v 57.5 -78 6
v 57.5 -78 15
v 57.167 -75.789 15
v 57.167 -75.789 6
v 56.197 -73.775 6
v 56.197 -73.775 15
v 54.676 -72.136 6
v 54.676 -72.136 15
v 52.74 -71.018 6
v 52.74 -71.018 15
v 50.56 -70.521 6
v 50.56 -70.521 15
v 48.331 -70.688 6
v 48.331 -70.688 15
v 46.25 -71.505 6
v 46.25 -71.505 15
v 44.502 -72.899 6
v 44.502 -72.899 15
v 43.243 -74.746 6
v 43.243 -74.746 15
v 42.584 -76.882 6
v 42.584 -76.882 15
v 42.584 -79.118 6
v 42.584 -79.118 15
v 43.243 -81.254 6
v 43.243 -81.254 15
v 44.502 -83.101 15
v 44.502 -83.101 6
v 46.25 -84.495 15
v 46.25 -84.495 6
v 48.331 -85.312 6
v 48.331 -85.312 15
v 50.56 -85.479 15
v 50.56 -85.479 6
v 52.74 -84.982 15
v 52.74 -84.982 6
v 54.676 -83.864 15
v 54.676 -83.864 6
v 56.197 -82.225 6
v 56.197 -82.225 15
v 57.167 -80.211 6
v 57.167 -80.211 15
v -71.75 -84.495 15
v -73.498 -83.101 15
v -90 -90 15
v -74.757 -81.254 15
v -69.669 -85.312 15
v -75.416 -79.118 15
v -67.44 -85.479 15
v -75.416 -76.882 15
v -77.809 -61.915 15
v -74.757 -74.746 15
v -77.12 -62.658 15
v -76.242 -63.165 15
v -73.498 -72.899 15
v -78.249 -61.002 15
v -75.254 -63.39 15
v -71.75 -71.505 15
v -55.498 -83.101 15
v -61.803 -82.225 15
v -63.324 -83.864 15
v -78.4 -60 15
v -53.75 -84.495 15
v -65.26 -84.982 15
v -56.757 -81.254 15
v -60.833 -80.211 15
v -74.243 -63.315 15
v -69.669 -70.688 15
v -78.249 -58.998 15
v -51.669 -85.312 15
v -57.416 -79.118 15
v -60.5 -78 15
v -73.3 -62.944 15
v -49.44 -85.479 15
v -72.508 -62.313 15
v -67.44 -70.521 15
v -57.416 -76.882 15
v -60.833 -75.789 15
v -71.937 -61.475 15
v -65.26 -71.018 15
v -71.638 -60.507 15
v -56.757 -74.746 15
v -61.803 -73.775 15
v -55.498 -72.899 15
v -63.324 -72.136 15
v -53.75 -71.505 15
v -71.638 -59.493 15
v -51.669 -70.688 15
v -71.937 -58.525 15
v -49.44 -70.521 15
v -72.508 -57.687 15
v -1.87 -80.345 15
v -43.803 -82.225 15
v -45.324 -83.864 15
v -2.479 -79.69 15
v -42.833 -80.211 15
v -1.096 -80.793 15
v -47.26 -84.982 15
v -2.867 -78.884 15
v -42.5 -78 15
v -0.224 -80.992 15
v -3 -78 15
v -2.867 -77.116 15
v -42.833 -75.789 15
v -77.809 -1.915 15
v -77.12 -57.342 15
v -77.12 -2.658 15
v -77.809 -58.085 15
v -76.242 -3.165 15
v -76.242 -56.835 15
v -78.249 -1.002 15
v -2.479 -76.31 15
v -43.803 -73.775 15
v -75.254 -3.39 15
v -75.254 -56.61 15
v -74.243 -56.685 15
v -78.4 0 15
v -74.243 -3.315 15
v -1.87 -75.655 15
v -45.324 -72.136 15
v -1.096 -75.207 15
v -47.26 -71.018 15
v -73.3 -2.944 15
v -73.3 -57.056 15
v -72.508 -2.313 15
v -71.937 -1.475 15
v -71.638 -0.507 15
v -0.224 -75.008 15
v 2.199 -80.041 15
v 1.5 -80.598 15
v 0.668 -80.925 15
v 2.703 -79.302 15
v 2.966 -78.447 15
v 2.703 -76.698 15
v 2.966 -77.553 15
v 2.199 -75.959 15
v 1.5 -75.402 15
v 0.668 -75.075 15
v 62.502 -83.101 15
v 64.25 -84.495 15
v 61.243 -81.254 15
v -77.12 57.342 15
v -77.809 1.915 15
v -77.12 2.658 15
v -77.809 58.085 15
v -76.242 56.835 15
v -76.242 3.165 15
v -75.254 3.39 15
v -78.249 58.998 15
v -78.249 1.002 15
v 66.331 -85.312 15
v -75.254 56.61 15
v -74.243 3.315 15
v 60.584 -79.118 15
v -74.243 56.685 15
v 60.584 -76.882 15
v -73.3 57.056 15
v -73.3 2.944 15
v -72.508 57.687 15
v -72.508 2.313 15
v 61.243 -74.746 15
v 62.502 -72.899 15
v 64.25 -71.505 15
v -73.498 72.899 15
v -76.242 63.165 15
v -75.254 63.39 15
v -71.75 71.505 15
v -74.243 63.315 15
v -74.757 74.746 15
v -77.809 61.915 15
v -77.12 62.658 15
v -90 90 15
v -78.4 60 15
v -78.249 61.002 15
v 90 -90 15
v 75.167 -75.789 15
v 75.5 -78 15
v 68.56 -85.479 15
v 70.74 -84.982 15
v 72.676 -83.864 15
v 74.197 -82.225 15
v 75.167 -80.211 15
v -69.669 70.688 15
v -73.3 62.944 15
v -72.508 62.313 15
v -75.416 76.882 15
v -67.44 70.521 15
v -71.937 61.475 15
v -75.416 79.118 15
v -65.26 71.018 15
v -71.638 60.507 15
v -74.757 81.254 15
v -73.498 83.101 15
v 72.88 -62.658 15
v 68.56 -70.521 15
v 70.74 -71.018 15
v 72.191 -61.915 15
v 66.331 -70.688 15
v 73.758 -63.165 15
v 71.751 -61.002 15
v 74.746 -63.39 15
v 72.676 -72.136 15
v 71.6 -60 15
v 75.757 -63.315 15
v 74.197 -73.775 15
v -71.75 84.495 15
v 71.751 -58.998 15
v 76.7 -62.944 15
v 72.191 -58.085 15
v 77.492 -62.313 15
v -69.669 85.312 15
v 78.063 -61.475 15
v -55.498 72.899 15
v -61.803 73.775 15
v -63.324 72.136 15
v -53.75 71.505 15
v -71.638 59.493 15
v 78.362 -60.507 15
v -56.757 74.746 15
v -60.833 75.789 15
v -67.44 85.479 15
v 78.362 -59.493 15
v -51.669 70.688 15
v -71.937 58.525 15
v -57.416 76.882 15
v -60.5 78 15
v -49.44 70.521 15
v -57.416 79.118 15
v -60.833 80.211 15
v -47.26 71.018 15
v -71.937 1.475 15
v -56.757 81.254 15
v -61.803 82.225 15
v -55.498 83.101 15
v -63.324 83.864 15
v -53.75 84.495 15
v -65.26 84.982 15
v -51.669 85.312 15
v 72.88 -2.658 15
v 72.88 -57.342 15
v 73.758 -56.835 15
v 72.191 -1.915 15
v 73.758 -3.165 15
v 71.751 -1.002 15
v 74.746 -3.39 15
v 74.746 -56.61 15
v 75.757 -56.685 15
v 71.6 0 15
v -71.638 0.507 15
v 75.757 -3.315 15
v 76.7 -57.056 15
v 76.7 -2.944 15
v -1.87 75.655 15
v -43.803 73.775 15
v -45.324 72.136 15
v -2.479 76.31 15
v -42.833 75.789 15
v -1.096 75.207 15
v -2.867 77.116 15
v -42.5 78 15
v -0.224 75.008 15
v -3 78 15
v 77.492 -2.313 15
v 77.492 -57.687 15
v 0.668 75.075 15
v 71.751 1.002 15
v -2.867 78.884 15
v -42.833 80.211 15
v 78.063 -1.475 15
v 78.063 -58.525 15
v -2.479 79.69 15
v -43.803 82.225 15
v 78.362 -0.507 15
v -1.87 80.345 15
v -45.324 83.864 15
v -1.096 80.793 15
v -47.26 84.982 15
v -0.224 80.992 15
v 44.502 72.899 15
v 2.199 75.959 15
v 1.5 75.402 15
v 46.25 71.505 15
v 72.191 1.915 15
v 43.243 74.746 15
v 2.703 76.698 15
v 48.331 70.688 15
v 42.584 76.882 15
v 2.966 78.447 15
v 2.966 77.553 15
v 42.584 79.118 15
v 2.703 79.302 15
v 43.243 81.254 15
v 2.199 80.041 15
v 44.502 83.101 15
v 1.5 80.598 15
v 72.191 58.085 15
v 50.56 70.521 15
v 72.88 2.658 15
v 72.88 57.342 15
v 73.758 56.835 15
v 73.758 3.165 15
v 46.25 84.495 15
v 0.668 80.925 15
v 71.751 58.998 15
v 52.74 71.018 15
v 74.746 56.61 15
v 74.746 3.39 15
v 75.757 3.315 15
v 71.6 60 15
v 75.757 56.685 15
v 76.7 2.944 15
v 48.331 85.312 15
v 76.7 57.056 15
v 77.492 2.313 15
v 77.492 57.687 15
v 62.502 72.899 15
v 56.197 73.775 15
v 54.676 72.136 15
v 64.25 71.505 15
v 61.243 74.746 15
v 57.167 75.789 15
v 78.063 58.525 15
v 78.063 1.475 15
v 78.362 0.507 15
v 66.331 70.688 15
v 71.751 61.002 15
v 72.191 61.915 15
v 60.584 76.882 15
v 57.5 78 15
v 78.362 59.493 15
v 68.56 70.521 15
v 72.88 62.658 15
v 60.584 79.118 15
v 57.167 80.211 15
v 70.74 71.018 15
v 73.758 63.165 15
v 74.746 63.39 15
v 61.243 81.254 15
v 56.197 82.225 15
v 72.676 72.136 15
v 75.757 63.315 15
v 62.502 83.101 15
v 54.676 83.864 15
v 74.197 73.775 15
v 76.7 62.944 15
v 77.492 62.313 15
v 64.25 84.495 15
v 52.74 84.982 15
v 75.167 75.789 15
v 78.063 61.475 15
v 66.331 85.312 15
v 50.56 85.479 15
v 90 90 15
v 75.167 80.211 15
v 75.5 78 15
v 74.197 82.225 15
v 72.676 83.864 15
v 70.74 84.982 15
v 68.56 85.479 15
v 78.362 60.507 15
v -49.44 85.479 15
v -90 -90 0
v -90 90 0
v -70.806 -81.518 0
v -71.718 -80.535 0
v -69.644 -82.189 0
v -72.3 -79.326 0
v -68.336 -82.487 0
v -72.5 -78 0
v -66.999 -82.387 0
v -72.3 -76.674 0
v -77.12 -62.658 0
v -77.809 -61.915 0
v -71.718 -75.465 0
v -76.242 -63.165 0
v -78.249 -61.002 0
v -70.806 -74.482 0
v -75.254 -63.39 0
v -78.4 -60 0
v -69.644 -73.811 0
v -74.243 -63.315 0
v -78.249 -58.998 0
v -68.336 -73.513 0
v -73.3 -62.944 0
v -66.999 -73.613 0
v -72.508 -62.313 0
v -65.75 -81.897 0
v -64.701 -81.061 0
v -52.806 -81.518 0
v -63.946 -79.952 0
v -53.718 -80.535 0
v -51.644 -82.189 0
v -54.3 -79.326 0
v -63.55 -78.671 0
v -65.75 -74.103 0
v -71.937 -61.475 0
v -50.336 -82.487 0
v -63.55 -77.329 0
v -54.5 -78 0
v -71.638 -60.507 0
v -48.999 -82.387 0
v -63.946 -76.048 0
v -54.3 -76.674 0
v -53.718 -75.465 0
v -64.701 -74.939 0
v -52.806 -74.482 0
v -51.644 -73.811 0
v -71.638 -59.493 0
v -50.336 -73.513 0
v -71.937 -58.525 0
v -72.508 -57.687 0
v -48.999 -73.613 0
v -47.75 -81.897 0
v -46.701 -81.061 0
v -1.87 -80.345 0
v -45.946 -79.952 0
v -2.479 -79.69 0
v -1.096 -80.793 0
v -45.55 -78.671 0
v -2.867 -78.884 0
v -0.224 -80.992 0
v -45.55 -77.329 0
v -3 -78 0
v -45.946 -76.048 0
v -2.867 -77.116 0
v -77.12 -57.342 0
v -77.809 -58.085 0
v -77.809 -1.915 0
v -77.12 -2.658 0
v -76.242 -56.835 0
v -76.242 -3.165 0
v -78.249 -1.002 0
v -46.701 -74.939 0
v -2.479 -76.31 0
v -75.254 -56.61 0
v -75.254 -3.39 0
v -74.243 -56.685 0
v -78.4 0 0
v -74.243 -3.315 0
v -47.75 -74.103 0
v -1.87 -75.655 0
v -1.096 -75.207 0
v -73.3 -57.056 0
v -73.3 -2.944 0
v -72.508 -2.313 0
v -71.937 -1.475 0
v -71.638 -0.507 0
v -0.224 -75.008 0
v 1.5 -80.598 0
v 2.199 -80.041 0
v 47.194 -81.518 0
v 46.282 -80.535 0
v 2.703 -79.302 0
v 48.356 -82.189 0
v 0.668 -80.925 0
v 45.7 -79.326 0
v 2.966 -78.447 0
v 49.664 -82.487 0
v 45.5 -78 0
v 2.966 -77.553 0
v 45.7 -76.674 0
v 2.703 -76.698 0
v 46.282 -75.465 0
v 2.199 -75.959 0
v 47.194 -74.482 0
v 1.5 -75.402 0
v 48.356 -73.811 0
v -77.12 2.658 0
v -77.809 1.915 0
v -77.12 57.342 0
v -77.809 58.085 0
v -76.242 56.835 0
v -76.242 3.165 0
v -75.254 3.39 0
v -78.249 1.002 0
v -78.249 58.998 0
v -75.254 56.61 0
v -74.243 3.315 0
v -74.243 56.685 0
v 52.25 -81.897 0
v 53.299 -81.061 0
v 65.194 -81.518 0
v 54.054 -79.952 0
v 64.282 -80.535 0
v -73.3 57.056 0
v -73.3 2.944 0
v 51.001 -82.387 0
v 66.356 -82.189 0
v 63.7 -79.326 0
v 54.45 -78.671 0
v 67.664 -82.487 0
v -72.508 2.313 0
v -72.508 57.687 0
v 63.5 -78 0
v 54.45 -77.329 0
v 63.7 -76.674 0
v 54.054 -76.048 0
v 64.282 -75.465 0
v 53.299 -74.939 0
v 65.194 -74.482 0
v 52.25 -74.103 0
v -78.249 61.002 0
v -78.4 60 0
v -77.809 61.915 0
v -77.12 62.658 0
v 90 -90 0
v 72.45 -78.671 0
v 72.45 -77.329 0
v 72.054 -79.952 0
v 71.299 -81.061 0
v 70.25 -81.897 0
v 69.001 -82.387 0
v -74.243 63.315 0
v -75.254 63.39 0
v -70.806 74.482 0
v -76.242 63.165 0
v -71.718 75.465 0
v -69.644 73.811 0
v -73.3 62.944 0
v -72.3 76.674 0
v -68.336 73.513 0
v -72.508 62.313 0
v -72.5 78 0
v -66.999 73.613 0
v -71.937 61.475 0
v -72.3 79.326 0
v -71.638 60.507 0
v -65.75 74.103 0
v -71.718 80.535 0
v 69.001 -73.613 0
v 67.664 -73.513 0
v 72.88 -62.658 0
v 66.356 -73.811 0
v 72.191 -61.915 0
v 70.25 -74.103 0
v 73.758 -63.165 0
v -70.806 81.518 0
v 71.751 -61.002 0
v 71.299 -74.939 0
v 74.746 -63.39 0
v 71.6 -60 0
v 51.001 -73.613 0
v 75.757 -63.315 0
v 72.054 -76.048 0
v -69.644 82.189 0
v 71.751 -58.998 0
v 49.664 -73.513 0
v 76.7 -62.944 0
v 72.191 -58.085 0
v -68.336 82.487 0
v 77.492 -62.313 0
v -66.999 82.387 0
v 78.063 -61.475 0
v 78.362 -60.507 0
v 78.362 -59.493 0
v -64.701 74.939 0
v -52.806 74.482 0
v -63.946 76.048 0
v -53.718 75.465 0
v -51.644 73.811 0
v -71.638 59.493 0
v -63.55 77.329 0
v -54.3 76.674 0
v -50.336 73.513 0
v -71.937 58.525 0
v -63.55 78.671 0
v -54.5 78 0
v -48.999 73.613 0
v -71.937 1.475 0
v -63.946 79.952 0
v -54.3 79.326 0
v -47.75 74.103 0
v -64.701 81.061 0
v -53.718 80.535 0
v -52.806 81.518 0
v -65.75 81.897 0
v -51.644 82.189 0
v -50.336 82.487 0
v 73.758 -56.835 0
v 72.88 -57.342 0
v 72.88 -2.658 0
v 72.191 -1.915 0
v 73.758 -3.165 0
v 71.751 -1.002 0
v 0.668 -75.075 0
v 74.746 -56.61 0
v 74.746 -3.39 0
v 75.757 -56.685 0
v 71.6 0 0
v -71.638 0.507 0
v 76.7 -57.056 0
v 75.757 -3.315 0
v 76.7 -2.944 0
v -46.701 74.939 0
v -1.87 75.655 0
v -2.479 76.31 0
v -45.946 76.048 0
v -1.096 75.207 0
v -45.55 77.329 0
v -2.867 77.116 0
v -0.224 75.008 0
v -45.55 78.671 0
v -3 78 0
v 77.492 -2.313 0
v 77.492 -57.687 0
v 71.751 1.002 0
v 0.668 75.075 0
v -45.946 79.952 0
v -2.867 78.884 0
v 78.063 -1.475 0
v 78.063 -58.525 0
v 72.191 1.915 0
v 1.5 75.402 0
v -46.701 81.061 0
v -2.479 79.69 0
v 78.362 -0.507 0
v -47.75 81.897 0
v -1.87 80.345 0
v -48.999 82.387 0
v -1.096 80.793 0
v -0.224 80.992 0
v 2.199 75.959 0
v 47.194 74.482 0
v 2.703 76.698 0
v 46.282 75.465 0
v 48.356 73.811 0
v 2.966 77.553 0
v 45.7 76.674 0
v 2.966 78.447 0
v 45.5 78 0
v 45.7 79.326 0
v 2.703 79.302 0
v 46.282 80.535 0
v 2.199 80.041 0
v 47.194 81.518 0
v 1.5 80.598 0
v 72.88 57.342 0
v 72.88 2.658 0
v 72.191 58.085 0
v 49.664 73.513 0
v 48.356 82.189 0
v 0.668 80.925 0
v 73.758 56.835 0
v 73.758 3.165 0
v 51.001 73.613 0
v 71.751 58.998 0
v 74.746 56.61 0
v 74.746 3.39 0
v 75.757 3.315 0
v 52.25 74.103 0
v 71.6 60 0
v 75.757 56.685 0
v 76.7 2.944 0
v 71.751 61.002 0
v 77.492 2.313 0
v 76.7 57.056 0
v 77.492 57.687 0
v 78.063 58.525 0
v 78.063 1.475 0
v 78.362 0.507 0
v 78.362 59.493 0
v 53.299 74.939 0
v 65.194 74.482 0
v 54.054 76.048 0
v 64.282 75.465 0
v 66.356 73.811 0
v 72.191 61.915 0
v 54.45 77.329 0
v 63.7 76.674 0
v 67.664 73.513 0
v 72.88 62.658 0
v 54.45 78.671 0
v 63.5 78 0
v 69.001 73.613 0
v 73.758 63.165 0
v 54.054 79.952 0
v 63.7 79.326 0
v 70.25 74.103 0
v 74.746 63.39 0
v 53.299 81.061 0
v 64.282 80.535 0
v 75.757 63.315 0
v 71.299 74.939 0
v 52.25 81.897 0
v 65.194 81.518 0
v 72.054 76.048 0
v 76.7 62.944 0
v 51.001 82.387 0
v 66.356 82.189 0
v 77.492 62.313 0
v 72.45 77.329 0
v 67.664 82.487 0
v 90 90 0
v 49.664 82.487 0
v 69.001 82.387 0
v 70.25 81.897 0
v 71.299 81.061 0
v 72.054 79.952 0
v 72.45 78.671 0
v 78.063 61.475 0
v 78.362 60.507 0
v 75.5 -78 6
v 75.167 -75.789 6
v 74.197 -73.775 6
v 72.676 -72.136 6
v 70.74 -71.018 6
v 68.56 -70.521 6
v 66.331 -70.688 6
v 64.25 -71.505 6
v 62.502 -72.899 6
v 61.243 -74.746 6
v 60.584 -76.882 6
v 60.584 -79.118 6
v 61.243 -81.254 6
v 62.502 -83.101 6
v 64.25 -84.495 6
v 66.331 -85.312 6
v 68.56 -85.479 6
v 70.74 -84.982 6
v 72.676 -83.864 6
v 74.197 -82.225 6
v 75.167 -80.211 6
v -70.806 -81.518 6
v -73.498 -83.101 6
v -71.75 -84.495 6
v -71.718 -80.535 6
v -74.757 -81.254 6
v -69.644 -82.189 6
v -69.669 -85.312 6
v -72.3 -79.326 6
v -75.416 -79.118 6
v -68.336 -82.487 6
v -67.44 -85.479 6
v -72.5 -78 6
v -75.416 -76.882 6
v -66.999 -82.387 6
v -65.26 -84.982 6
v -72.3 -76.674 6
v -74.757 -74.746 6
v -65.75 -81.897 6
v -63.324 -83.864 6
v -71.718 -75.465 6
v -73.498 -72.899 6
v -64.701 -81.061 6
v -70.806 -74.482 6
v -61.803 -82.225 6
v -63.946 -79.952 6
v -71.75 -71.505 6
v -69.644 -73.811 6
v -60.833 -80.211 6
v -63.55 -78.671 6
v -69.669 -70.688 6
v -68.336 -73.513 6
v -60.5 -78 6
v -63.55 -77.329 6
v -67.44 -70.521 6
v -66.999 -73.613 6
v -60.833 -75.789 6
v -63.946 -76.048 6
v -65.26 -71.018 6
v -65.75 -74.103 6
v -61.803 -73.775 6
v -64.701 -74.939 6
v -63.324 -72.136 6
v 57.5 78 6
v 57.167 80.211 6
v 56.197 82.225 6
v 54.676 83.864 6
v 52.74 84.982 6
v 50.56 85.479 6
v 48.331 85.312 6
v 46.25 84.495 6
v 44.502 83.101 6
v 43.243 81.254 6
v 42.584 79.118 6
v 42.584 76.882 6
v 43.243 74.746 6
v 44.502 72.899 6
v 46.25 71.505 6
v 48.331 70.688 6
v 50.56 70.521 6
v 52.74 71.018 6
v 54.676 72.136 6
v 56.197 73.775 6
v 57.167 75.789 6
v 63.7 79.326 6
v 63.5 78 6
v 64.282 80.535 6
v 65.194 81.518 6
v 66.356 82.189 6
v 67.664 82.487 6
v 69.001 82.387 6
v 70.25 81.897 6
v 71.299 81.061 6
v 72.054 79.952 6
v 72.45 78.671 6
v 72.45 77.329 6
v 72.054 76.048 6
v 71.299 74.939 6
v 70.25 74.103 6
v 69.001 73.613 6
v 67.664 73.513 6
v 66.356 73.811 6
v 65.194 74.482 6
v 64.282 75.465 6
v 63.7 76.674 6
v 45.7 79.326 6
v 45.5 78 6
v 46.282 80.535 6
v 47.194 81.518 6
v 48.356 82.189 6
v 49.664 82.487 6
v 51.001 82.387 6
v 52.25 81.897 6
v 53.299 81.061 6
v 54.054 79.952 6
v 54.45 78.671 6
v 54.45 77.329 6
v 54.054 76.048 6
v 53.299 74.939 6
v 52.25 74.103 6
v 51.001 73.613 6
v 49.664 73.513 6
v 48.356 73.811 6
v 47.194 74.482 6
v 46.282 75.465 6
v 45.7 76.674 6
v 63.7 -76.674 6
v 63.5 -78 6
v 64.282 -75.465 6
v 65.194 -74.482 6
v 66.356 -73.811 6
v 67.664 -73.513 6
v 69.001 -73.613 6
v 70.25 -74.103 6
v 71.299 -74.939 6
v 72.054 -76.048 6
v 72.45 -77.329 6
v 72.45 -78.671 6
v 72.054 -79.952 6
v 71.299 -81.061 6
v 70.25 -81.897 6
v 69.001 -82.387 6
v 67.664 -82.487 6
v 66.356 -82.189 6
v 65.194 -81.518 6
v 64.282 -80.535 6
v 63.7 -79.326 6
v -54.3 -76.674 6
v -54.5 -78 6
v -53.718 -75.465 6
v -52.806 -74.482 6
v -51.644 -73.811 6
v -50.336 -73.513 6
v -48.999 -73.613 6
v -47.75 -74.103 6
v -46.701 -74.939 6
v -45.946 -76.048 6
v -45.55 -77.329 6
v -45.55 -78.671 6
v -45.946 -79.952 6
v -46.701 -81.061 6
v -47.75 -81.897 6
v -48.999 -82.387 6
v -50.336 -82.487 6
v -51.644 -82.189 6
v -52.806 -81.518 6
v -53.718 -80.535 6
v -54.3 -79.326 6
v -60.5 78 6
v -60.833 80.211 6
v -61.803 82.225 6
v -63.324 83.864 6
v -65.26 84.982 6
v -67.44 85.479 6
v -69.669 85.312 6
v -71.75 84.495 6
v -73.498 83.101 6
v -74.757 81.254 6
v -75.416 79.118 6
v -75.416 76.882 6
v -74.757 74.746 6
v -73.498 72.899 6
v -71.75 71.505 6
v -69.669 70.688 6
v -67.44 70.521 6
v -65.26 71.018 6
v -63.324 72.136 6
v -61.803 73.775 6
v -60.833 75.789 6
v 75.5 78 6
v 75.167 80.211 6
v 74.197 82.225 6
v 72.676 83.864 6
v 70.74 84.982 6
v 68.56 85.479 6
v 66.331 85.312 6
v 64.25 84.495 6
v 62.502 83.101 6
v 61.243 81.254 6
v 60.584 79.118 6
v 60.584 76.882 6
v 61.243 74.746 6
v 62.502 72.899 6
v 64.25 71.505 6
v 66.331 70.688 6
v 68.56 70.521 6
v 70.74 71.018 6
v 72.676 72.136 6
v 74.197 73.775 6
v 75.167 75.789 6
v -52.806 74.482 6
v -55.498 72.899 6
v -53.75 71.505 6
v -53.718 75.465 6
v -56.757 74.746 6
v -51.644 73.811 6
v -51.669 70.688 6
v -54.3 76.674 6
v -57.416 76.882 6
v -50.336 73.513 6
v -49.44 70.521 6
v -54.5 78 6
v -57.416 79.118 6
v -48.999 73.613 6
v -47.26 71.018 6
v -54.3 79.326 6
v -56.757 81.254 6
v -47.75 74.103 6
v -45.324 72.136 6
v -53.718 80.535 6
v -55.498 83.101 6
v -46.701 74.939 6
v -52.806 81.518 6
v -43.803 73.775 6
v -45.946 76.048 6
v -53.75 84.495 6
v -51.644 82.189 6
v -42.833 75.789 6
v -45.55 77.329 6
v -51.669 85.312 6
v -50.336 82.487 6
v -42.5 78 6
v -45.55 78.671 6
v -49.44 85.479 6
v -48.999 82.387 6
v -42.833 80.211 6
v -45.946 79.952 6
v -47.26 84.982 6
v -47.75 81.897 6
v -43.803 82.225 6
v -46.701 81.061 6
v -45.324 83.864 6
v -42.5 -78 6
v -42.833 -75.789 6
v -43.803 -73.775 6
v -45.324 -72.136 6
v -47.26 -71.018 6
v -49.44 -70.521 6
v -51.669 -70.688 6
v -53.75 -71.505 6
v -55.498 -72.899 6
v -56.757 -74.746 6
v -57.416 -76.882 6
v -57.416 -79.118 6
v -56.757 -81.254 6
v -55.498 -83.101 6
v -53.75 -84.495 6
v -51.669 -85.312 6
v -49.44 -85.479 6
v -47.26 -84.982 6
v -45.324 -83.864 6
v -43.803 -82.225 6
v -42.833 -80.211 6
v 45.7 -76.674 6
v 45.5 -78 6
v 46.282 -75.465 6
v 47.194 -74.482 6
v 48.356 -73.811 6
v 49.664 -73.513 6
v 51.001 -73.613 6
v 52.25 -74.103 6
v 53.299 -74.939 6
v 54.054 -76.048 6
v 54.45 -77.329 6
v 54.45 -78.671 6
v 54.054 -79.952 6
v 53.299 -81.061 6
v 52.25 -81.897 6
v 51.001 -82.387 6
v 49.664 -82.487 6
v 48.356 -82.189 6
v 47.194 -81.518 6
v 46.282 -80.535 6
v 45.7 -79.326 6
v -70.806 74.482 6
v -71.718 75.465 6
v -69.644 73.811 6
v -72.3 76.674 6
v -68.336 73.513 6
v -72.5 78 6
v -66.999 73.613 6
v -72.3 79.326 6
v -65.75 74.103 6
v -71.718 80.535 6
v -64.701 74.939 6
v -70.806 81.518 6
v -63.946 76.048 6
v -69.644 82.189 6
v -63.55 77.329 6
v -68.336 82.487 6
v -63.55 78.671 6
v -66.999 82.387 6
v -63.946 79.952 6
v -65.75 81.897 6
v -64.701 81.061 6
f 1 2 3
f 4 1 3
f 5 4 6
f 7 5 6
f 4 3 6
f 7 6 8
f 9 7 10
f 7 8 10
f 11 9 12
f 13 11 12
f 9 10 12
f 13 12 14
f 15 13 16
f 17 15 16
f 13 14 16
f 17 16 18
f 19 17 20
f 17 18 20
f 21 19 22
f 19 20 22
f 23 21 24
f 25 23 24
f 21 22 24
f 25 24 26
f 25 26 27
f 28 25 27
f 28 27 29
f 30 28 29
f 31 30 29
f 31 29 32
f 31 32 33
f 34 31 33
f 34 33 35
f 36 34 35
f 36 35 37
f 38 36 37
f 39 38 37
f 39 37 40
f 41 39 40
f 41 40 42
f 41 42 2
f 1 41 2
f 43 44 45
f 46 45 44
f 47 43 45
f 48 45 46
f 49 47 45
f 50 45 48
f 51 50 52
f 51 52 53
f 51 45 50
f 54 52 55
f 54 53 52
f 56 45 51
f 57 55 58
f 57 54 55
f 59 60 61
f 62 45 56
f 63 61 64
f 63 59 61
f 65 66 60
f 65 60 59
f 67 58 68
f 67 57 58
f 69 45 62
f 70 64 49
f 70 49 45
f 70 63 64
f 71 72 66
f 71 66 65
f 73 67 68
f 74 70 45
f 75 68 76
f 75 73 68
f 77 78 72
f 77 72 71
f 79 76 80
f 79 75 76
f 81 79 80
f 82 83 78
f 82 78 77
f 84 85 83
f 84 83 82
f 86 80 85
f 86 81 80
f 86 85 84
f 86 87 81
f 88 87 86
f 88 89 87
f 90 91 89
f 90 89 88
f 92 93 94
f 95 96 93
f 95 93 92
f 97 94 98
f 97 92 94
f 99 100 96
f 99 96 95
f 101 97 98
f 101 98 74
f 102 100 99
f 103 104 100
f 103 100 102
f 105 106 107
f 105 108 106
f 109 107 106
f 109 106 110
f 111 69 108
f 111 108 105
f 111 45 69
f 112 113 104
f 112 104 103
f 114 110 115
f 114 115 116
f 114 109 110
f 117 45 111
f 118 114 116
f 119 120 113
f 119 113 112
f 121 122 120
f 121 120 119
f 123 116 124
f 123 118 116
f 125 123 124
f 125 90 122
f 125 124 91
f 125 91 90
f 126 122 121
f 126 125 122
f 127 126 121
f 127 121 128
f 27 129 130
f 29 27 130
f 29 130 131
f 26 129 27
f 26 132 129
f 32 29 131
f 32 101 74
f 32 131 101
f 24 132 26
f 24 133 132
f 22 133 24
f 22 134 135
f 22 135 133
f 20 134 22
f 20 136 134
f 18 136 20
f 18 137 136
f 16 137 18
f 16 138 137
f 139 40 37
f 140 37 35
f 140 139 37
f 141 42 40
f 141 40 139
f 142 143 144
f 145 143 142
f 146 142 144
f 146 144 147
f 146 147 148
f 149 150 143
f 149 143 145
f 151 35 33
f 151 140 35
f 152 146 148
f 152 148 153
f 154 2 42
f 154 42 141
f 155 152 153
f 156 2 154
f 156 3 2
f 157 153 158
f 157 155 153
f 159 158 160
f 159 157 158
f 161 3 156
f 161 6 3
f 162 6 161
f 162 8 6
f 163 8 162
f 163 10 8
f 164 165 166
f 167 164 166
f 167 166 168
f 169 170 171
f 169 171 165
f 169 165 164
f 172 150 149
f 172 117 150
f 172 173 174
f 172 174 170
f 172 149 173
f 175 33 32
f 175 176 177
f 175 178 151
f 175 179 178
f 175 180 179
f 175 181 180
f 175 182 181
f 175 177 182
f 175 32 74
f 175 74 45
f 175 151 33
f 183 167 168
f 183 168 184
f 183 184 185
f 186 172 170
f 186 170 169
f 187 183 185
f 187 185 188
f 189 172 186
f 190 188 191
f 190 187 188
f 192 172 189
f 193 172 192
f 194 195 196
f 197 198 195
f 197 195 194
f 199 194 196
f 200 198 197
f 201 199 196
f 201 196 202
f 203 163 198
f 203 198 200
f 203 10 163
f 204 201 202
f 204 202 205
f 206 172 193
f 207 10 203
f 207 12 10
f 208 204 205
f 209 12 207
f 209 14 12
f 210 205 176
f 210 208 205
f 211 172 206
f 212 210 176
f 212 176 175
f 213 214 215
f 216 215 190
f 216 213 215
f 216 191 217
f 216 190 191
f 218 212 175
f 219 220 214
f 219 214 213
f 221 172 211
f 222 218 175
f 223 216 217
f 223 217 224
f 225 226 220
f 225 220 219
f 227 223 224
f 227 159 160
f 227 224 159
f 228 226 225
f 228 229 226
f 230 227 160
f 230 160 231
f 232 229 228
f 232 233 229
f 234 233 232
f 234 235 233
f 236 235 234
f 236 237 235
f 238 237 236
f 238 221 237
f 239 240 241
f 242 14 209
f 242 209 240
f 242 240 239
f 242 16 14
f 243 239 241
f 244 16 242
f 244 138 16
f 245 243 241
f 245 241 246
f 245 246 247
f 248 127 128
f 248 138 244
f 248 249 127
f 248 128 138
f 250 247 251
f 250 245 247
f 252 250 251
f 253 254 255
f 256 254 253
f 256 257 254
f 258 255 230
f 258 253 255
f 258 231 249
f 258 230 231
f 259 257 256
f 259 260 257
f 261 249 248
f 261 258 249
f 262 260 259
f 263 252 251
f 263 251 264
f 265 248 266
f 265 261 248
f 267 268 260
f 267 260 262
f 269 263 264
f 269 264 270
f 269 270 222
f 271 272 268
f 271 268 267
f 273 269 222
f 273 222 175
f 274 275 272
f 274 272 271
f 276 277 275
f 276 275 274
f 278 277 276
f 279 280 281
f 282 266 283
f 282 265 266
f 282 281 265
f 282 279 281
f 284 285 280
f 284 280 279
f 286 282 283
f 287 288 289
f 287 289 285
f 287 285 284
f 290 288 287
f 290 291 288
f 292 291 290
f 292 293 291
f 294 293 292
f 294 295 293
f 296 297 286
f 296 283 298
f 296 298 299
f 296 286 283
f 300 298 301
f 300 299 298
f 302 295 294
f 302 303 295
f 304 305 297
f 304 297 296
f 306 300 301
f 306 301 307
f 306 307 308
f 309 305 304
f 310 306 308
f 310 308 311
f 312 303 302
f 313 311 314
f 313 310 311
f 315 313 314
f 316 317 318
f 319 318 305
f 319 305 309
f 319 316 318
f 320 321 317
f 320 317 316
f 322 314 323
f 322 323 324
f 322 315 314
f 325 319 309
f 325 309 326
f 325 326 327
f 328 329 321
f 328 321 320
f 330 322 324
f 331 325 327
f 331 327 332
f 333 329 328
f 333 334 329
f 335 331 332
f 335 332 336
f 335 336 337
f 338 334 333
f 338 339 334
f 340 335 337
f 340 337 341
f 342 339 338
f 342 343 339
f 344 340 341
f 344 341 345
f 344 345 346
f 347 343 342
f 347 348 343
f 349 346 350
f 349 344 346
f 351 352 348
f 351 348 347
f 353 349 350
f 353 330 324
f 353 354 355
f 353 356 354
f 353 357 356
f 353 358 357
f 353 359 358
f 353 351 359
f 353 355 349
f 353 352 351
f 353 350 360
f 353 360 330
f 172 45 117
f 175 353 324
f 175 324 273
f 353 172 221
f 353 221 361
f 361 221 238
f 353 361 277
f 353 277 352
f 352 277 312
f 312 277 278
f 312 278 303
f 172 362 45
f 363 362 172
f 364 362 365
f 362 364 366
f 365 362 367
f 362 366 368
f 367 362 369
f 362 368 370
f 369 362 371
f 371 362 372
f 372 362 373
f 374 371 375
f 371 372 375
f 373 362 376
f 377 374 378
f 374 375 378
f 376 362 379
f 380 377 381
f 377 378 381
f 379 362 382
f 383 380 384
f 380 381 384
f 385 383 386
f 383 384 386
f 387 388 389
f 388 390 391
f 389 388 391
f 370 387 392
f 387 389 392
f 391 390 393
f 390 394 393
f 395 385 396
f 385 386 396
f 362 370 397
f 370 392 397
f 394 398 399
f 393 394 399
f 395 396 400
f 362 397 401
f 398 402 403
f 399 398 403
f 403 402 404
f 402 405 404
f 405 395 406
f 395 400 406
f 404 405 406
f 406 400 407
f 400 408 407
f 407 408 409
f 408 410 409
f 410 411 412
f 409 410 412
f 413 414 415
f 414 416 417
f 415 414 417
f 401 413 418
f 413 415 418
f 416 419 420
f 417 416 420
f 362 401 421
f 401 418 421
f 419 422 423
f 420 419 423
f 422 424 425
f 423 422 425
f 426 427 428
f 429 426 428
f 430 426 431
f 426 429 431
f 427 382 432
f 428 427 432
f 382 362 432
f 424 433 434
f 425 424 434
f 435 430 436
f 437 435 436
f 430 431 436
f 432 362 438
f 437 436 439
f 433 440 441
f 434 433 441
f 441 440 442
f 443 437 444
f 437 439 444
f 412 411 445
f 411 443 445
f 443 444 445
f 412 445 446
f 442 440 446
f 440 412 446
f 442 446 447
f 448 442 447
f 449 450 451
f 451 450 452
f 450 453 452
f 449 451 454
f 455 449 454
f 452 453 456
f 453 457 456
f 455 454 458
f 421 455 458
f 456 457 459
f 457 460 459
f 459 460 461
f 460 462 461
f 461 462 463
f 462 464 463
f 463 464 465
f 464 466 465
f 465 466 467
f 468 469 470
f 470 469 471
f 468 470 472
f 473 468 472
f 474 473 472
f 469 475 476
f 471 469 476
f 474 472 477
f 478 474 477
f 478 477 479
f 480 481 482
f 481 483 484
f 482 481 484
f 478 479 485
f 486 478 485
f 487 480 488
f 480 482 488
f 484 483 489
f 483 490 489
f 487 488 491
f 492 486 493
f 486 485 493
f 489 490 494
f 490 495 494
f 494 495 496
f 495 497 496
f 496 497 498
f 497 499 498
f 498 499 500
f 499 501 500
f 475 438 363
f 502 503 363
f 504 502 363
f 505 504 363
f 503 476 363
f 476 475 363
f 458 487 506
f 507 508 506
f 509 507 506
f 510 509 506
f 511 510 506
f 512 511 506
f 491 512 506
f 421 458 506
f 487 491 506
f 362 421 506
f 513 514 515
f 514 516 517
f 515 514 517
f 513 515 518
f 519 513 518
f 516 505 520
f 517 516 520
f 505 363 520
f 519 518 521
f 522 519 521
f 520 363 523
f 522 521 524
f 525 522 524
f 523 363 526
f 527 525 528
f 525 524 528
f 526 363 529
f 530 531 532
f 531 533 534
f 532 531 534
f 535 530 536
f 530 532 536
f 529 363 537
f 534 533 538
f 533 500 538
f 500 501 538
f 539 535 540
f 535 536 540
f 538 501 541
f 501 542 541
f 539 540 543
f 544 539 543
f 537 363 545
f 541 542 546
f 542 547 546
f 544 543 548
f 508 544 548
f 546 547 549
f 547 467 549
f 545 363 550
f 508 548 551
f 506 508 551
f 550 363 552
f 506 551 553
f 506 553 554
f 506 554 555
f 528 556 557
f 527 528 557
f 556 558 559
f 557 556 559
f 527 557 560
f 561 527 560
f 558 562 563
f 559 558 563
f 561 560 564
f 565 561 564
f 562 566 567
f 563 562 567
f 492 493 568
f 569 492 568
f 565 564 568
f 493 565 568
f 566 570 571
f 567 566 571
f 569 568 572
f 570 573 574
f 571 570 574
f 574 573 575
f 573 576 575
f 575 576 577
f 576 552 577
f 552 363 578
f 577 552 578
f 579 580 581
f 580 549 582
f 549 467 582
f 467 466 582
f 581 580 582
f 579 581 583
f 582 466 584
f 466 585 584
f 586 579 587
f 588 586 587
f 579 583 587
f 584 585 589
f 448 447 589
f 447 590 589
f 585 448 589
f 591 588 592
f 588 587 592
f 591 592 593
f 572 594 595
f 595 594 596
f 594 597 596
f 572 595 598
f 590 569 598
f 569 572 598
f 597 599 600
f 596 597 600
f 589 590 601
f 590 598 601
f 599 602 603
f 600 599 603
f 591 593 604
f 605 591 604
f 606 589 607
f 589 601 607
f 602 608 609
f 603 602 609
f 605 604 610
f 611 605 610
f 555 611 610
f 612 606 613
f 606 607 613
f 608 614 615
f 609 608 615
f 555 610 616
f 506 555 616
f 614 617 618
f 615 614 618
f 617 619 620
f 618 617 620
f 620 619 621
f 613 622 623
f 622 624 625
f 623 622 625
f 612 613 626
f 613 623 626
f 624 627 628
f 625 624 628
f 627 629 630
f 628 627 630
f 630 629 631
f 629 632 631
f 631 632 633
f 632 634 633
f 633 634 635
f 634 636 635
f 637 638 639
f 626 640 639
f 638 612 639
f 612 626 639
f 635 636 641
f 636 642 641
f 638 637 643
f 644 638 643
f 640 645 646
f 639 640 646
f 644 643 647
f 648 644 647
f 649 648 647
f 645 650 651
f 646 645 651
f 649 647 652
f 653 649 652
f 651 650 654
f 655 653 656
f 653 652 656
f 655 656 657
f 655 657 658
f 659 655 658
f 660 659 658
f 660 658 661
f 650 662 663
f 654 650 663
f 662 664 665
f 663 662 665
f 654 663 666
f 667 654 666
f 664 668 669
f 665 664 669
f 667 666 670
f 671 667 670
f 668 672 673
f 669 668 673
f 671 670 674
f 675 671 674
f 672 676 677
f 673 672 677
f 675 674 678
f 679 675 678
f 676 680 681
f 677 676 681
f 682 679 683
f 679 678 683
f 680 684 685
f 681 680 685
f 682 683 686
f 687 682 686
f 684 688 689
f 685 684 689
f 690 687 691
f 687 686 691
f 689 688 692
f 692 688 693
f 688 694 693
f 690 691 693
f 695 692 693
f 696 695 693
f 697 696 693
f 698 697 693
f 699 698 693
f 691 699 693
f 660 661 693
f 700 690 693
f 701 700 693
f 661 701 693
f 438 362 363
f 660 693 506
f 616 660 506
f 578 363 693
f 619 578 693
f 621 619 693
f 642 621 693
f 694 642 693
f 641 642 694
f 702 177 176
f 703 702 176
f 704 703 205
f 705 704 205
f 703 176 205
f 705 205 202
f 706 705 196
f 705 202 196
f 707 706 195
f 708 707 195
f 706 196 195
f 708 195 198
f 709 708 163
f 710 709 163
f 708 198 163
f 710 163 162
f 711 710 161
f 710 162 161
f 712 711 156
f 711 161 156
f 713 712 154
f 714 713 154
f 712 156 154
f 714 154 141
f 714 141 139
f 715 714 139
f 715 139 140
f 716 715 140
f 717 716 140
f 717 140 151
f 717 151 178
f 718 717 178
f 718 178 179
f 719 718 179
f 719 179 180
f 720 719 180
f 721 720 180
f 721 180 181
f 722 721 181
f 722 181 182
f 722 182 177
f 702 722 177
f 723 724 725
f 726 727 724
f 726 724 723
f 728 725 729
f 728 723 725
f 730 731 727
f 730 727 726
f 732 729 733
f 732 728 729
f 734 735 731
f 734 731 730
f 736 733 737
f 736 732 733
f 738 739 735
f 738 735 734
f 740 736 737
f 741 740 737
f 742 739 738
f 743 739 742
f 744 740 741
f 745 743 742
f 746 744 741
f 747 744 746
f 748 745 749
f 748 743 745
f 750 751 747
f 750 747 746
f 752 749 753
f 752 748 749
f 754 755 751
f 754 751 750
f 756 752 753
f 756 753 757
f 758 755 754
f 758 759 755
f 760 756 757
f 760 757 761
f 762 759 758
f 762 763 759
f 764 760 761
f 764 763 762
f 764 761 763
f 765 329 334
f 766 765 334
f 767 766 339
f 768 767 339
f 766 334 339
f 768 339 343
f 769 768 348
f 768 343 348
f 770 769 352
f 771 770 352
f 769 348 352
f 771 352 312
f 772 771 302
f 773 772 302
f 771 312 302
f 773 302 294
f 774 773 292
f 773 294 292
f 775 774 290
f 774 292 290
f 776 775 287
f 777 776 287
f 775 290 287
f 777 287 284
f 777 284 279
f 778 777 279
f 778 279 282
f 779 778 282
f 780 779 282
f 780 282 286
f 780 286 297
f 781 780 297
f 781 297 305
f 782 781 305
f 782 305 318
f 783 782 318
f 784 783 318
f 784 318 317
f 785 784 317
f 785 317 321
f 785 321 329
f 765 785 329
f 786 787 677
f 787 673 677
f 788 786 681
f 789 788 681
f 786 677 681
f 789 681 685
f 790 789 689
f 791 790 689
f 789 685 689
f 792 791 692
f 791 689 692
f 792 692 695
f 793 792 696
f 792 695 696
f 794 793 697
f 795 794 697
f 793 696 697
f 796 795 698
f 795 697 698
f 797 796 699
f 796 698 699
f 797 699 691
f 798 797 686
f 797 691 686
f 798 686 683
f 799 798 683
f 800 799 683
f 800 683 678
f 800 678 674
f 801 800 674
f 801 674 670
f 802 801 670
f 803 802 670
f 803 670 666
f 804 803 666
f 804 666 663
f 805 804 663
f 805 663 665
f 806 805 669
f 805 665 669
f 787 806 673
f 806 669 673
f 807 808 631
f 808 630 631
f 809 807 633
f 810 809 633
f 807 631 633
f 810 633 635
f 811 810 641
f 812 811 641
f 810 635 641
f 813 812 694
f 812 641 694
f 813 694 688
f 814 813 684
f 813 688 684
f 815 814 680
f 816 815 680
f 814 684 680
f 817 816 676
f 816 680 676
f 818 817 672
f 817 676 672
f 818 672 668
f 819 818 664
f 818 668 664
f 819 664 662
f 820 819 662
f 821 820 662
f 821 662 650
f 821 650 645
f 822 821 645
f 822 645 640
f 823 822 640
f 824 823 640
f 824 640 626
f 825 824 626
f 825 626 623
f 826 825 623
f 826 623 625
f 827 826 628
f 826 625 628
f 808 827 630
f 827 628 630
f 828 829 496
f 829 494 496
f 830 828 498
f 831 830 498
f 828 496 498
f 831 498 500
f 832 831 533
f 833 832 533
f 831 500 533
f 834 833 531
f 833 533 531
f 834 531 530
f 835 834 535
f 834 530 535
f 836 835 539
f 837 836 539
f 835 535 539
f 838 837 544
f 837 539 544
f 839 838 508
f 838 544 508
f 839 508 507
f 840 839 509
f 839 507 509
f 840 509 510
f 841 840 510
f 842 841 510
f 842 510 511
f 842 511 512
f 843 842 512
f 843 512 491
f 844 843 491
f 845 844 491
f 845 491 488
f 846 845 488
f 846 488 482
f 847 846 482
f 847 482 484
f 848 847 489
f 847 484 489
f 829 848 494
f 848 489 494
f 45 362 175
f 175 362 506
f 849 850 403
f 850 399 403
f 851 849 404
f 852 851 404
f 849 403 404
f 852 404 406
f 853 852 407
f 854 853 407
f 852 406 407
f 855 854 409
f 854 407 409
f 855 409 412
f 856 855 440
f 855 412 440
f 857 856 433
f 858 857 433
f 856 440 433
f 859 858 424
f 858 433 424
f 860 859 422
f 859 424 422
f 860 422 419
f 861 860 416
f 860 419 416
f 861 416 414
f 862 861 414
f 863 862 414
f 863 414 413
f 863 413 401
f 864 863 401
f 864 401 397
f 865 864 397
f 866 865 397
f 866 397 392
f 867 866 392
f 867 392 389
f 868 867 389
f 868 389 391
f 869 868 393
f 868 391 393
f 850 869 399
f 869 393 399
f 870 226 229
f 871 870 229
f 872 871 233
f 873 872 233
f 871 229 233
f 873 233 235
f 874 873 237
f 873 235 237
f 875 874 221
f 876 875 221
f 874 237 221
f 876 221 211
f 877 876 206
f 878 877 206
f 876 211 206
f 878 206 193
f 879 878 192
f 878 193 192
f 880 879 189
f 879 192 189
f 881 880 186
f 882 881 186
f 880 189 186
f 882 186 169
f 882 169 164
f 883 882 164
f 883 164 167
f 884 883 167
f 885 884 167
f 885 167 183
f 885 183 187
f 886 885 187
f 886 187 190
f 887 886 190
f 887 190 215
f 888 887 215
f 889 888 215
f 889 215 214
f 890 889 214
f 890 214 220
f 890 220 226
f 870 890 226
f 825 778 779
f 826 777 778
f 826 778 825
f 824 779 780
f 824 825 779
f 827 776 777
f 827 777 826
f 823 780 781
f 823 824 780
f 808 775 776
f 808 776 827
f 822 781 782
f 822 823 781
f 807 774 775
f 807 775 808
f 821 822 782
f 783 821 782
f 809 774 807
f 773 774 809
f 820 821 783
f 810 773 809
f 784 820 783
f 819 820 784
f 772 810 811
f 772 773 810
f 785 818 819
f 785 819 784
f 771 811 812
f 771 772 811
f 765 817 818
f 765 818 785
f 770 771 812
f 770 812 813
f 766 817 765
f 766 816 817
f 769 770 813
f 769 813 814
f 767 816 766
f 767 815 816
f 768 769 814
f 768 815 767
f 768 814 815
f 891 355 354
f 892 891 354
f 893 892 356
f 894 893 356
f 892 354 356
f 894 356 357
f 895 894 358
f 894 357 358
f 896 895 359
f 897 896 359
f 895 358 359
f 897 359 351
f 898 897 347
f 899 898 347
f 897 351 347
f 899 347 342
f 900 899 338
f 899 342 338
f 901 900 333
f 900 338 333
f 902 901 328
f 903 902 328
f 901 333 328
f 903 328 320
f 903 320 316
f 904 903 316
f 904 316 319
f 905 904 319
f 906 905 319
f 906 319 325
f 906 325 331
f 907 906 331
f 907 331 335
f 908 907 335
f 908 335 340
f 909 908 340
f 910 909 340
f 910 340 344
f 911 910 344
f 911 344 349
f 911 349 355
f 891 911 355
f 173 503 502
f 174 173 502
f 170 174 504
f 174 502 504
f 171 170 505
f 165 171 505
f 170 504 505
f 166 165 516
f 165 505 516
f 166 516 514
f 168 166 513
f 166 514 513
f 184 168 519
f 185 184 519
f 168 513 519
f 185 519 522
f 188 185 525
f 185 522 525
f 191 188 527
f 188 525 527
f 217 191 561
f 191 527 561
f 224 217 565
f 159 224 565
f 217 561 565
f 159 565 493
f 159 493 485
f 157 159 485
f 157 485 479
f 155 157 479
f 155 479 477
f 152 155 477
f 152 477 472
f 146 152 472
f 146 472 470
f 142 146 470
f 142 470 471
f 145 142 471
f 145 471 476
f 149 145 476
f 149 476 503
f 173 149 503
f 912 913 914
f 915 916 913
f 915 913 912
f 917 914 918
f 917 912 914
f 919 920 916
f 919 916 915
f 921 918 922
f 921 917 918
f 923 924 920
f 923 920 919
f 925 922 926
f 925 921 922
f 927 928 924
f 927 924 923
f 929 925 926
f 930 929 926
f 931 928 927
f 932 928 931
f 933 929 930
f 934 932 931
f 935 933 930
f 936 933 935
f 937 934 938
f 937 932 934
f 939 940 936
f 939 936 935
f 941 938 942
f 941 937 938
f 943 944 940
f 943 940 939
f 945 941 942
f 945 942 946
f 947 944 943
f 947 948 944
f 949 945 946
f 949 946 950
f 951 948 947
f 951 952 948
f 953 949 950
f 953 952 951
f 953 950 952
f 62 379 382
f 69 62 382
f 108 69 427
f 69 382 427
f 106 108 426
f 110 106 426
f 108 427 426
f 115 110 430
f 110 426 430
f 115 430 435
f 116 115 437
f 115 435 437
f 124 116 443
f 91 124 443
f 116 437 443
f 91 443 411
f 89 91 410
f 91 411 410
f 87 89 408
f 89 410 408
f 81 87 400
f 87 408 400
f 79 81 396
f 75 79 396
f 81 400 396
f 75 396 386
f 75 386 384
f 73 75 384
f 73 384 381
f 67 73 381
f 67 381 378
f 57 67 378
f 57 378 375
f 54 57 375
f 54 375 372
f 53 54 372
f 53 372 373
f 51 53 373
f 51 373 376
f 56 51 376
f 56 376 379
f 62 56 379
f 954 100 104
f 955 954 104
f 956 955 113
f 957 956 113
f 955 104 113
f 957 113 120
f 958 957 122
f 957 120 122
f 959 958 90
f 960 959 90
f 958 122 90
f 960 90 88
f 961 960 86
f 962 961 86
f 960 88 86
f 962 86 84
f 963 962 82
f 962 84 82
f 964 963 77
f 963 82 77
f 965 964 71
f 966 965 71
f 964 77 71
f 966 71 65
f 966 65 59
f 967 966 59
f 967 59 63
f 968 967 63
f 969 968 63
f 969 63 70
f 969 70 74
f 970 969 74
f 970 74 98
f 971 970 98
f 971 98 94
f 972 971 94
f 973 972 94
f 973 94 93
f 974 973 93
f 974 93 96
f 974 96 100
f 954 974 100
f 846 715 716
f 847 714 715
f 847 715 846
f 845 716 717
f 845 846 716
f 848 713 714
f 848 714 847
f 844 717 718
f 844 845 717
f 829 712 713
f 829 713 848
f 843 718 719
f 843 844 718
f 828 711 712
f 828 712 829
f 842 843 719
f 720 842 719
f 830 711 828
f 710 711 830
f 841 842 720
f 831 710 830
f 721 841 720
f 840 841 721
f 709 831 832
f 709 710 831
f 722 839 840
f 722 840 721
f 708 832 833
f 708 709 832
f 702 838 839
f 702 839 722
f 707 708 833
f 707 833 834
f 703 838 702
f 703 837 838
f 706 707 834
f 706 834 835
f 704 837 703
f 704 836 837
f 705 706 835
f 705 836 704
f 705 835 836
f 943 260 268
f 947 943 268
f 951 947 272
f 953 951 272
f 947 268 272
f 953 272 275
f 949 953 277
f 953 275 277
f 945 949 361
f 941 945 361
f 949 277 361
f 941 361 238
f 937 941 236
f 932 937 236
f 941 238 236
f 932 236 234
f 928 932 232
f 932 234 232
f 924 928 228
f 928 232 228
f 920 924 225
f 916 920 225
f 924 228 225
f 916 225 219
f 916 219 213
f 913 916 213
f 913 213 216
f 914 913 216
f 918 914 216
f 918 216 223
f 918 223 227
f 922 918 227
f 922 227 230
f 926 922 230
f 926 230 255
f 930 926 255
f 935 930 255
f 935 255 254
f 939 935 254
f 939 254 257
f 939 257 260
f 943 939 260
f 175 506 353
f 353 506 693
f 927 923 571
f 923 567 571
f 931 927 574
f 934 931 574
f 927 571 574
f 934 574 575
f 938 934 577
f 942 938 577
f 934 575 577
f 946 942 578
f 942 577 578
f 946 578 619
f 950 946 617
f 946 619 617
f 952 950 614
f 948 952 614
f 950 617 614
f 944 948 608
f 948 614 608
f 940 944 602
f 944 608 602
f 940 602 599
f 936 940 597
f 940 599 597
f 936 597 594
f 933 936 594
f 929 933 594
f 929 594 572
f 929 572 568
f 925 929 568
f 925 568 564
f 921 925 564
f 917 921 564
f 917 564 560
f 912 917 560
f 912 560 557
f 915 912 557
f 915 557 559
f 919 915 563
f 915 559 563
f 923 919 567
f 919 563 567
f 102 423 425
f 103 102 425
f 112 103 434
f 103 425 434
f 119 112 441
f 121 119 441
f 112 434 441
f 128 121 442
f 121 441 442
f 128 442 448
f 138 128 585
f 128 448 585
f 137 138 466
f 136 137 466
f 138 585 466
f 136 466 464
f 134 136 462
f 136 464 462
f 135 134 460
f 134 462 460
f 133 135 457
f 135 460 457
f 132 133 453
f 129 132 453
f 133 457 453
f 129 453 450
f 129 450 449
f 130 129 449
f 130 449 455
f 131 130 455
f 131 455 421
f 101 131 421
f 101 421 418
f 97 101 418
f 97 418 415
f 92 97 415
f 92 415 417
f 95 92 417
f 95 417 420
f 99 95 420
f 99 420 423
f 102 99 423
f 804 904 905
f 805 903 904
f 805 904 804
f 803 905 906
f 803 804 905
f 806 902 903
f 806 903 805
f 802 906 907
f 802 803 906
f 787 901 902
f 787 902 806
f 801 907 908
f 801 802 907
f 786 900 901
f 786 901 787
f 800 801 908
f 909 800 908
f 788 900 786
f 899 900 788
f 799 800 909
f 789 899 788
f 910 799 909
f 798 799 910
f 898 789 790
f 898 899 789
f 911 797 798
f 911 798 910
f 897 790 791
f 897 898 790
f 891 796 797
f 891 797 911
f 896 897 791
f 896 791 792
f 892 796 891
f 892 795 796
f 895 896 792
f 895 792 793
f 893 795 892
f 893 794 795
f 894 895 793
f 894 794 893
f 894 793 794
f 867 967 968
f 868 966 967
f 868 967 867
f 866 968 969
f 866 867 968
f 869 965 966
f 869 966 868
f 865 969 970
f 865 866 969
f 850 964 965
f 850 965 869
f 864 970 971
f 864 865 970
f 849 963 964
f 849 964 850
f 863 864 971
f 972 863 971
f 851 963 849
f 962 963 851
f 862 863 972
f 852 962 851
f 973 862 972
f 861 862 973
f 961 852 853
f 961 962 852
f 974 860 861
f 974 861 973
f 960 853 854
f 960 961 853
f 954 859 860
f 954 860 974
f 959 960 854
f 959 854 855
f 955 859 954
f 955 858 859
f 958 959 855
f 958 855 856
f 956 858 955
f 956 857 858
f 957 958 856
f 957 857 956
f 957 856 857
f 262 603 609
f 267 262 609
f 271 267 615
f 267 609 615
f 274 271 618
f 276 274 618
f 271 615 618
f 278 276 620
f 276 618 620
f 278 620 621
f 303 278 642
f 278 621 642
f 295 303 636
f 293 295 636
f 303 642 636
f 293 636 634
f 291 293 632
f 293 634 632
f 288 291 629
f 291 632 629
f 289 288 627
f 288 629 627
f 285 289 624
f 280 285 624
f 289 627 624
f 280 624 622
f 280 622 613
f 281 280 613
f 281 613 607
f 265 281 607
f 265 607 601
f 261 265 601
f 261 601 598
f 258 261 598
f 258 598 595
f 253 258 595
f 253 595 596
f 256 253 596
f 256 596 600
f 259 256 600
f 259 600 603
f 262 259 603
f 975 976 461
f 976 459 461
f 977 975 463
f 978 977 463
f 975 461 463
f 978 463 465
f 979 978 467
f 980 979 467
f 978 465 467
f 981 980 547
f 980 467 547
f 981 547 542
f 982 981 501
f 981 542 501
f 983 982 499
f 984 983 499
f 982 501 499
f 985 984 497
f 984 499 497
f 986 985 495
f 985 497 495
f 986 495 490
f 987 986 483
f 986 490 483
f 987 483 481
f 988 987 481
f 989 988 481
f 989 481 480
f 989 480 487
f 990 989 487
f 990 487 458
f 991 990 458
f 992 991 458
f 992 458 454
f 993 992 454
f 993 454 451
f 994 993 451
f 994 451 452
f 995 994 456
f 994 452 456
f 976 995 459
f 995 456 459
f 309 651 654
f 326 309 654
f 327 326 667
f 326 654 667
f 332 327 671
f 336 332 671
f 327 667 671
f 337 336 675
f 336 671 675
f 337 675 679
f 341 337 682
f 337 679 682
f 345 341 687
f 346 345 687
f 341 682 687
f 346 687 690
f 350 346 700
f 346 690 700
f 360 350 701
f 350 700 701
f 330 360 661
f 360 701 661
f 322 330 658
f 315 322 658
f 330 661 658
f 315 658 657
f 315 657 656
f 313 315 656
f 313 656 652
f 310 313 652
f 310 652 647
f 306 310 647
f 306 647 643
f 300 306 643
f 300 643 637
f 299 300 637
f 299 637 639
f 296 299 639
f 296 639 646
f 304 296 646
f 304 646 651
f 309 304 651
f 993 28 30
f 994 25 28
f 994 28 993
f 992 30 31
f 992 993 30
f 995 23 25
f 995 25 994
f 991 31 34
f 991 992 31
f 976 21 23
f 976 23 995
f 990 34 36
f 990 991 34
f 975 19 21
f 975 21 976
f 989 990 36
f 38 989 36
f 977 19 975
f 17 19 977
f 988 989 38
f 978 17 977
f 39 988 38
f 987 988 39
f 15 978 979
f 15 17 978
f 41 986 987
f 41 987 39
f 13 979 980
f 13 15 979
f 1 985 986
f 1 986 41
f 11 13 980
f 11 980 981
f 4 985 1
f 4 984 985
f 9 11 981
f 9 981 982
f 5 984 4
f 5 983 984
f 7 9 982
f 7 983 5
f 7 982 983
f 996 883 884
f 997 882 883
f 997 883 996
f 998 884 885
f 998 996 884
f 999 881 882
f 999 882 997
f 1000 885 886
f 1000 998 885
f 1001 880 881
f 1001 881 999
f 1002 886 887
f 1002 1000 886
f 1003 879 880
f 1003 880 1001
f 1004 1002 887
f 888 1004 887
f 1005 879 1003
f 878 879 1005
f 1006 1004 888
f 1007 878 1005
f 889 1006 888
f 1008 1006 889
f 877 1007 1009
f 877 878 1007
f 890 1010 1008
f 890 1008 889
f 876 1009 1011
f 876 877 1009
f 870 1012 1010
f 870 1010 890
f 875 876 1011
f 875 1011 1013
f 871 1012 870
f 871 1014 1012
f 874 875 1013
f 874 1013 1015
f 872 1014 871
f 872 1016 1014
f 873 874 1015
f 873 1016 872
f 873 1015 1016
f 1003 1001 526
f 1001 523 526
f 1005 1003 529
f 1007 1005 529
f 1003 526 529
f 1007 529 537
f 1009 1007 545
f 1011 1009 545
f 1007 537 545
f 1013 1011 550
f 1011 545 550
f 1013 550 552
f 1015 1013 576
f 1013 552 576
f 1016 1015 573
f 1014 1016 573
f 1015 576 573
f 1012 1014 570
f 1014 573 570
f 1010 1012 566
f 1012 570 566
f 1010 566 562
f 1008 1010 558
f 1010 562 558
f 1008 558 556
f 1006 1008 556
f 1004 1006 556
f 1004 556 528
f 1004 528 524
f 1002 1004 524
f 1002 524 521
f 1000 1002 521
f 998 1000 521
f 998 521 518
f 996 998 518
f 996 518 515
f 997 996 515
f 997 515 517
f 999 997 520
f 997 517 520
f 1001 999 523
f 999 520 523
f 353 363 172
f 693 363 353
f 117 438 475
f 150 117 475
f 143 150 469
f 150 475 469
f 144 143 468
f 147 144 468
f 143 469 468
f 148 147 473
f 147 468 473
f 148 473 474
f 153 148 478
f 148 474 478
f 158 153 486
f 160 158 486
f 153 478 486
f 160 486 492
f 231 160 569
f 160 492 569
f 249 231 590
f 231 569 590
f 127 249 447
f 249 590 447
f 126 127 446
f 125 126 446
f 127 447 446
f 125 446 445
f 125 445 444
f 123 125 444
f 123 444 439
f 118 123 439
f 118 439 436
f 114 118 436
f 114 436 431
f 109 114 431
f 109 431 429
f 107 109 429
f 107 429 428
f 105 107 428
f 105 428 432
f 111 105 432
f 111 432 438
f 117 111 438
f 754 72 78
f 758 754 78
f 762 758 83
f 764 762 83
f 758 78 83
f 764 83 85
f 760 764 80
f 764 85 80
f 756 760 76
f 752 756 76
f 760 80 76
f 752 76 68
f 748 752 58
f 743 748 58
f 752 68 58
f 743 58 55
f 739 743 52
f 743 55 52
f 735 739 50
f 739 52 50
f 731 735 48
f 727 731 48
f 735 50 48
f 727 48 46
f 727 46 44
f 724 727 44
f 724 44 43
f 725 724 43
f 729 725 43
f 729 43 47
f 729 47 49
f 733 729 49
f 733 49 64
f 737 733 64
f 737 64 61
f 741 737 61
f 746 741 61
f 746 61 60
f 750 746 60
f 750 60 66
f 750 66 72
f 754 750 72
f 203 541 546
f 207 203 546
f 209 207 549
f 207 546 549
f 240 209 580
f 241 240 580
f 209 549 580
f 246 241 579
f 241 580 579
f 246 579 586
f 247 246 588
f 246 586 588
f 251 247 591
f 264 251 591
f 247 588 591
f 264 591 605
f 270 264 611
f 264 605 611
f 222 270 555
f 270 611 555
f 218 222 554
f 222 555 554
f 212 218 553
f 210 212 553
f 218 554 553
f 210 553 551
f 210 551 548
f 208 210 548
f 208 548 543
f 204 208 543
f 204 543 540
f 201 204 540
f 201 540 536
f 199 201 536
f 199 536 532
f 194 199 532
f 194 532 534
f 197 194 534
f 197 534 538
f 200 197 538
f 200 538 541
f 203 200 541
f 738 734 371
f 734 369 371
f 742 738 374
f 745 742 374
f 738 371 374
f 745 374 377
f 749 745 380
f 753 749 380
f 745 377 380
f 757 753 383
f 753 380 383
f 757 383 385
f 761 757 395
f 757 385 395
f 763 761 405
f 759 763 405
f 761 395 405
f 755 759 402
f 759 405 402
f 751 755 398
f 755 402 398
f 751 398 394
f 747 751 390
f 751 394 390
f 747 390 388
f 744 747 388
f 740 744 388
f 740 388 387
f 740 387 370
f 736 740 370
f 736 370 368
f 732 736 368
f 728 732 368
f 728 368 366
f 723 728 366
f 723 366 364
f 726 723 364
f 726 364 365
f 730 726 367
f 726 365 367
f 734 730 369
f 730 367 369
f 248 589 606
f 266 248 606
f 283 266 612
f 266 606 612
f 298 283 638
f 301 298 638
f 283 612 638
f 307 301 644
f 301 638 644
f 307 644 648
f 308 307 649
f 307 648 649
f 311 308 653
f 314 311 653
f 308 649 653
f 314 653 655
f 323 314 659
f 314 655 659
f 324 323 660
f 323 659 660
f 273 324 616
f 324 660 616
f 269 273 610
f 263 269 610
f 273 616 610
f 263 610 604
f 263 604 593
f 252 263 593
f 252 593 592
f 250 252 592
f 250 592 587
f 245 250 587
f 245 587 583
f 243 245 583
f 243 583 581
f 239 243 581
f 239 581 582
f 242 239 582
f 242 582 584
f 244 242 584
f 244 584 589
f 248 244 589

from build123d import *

# Parameters (mm, degrees)
SKETCH_1_W                    = 180
SKETCH_1_H                    = 180
EXTRUDE_1_DEPTH               = 15
HOLE_WIZARD_4_8_1_D           = 9
HOLE_WIZARD_4_8_1_CBORE_D     = 15
HOLE_WIZARD_4_8_1_CBORE_DEPTH = 9
HOLE_WIZARD_6_0_6_1_D         = 6
HOLE_WIZARD_M8_1_D            = 6.8
HOLE_WIZARD_M8_1_DEPTH        = 22.25
HOLE_WIZARD_M8_1_TIP          = 2.042926105


with BuildPart() as part:
    # 草图1 → 凸台-拉伸1 (new body)
    with BuildSketch(Plane.XY):
        Rectangle(SKETCH_1_W, SKETCH_1_H)
    extrude(amount=EXTRUDE_1_DEPTH)

    # 打孔尺寸根据内六角花形圆柱头螺钉-4.8级的类型1 (through all)
    with Locations(Plane(origin=(-68, -78, 15), x_dir=(1, 0, 0), z_dir=(0, 0, 1))):
        with Locations((0, 0), (18, 0), (118, 0), (136, 0), (136, 156), (118, 156), (18, 156), (0, 156)):
            CounterBoreHole(HOLE_WIZARD_4_8_1_D / 2, HOLE_WIZARD_4_8_1_CBORE_D / 2, HOLE_WIZARD_4_8_1_CBORE_DEPTH)

    # Ø6.0 (6) 直径孔1 (through all)
    with Locations(Plane(origin=(0, 78, 15), x_dir=(1, 0, 0), z_dir=(0, 0, 1))):
        with Locations((0, 0), (0, -156)):
            Hole(HOLE_WIZARD_6_0_6_1_D / 2)

    # M8 螺纹孔1
    with Locations(Plane(origin=(-75, 60, 15), x_dir=(1, 0, 0), z_dir=(0, 0, 1))):
        with Locations((0, 0), (0, -60), (0, -120), (150, -120), (150, -60), (150, 0)):
            Hole(HOLE_WIZARD_M8_1_D / 2, depth=HOLE_WIZARD_M8_1_DEPTH)
            with Locations((0, 0, -(HOLE_WIZARD_M8_1_DEPTH + HOLE_WIZARD_M8_1_TIP / 2))):  # 118° drill point
                Cone(0, HOLE_WIZARD_M8_1_D / 2, HOLE_WIZARD_M8_1_TIP, mode=Mode.SUBTRACT)


solid = part.part
